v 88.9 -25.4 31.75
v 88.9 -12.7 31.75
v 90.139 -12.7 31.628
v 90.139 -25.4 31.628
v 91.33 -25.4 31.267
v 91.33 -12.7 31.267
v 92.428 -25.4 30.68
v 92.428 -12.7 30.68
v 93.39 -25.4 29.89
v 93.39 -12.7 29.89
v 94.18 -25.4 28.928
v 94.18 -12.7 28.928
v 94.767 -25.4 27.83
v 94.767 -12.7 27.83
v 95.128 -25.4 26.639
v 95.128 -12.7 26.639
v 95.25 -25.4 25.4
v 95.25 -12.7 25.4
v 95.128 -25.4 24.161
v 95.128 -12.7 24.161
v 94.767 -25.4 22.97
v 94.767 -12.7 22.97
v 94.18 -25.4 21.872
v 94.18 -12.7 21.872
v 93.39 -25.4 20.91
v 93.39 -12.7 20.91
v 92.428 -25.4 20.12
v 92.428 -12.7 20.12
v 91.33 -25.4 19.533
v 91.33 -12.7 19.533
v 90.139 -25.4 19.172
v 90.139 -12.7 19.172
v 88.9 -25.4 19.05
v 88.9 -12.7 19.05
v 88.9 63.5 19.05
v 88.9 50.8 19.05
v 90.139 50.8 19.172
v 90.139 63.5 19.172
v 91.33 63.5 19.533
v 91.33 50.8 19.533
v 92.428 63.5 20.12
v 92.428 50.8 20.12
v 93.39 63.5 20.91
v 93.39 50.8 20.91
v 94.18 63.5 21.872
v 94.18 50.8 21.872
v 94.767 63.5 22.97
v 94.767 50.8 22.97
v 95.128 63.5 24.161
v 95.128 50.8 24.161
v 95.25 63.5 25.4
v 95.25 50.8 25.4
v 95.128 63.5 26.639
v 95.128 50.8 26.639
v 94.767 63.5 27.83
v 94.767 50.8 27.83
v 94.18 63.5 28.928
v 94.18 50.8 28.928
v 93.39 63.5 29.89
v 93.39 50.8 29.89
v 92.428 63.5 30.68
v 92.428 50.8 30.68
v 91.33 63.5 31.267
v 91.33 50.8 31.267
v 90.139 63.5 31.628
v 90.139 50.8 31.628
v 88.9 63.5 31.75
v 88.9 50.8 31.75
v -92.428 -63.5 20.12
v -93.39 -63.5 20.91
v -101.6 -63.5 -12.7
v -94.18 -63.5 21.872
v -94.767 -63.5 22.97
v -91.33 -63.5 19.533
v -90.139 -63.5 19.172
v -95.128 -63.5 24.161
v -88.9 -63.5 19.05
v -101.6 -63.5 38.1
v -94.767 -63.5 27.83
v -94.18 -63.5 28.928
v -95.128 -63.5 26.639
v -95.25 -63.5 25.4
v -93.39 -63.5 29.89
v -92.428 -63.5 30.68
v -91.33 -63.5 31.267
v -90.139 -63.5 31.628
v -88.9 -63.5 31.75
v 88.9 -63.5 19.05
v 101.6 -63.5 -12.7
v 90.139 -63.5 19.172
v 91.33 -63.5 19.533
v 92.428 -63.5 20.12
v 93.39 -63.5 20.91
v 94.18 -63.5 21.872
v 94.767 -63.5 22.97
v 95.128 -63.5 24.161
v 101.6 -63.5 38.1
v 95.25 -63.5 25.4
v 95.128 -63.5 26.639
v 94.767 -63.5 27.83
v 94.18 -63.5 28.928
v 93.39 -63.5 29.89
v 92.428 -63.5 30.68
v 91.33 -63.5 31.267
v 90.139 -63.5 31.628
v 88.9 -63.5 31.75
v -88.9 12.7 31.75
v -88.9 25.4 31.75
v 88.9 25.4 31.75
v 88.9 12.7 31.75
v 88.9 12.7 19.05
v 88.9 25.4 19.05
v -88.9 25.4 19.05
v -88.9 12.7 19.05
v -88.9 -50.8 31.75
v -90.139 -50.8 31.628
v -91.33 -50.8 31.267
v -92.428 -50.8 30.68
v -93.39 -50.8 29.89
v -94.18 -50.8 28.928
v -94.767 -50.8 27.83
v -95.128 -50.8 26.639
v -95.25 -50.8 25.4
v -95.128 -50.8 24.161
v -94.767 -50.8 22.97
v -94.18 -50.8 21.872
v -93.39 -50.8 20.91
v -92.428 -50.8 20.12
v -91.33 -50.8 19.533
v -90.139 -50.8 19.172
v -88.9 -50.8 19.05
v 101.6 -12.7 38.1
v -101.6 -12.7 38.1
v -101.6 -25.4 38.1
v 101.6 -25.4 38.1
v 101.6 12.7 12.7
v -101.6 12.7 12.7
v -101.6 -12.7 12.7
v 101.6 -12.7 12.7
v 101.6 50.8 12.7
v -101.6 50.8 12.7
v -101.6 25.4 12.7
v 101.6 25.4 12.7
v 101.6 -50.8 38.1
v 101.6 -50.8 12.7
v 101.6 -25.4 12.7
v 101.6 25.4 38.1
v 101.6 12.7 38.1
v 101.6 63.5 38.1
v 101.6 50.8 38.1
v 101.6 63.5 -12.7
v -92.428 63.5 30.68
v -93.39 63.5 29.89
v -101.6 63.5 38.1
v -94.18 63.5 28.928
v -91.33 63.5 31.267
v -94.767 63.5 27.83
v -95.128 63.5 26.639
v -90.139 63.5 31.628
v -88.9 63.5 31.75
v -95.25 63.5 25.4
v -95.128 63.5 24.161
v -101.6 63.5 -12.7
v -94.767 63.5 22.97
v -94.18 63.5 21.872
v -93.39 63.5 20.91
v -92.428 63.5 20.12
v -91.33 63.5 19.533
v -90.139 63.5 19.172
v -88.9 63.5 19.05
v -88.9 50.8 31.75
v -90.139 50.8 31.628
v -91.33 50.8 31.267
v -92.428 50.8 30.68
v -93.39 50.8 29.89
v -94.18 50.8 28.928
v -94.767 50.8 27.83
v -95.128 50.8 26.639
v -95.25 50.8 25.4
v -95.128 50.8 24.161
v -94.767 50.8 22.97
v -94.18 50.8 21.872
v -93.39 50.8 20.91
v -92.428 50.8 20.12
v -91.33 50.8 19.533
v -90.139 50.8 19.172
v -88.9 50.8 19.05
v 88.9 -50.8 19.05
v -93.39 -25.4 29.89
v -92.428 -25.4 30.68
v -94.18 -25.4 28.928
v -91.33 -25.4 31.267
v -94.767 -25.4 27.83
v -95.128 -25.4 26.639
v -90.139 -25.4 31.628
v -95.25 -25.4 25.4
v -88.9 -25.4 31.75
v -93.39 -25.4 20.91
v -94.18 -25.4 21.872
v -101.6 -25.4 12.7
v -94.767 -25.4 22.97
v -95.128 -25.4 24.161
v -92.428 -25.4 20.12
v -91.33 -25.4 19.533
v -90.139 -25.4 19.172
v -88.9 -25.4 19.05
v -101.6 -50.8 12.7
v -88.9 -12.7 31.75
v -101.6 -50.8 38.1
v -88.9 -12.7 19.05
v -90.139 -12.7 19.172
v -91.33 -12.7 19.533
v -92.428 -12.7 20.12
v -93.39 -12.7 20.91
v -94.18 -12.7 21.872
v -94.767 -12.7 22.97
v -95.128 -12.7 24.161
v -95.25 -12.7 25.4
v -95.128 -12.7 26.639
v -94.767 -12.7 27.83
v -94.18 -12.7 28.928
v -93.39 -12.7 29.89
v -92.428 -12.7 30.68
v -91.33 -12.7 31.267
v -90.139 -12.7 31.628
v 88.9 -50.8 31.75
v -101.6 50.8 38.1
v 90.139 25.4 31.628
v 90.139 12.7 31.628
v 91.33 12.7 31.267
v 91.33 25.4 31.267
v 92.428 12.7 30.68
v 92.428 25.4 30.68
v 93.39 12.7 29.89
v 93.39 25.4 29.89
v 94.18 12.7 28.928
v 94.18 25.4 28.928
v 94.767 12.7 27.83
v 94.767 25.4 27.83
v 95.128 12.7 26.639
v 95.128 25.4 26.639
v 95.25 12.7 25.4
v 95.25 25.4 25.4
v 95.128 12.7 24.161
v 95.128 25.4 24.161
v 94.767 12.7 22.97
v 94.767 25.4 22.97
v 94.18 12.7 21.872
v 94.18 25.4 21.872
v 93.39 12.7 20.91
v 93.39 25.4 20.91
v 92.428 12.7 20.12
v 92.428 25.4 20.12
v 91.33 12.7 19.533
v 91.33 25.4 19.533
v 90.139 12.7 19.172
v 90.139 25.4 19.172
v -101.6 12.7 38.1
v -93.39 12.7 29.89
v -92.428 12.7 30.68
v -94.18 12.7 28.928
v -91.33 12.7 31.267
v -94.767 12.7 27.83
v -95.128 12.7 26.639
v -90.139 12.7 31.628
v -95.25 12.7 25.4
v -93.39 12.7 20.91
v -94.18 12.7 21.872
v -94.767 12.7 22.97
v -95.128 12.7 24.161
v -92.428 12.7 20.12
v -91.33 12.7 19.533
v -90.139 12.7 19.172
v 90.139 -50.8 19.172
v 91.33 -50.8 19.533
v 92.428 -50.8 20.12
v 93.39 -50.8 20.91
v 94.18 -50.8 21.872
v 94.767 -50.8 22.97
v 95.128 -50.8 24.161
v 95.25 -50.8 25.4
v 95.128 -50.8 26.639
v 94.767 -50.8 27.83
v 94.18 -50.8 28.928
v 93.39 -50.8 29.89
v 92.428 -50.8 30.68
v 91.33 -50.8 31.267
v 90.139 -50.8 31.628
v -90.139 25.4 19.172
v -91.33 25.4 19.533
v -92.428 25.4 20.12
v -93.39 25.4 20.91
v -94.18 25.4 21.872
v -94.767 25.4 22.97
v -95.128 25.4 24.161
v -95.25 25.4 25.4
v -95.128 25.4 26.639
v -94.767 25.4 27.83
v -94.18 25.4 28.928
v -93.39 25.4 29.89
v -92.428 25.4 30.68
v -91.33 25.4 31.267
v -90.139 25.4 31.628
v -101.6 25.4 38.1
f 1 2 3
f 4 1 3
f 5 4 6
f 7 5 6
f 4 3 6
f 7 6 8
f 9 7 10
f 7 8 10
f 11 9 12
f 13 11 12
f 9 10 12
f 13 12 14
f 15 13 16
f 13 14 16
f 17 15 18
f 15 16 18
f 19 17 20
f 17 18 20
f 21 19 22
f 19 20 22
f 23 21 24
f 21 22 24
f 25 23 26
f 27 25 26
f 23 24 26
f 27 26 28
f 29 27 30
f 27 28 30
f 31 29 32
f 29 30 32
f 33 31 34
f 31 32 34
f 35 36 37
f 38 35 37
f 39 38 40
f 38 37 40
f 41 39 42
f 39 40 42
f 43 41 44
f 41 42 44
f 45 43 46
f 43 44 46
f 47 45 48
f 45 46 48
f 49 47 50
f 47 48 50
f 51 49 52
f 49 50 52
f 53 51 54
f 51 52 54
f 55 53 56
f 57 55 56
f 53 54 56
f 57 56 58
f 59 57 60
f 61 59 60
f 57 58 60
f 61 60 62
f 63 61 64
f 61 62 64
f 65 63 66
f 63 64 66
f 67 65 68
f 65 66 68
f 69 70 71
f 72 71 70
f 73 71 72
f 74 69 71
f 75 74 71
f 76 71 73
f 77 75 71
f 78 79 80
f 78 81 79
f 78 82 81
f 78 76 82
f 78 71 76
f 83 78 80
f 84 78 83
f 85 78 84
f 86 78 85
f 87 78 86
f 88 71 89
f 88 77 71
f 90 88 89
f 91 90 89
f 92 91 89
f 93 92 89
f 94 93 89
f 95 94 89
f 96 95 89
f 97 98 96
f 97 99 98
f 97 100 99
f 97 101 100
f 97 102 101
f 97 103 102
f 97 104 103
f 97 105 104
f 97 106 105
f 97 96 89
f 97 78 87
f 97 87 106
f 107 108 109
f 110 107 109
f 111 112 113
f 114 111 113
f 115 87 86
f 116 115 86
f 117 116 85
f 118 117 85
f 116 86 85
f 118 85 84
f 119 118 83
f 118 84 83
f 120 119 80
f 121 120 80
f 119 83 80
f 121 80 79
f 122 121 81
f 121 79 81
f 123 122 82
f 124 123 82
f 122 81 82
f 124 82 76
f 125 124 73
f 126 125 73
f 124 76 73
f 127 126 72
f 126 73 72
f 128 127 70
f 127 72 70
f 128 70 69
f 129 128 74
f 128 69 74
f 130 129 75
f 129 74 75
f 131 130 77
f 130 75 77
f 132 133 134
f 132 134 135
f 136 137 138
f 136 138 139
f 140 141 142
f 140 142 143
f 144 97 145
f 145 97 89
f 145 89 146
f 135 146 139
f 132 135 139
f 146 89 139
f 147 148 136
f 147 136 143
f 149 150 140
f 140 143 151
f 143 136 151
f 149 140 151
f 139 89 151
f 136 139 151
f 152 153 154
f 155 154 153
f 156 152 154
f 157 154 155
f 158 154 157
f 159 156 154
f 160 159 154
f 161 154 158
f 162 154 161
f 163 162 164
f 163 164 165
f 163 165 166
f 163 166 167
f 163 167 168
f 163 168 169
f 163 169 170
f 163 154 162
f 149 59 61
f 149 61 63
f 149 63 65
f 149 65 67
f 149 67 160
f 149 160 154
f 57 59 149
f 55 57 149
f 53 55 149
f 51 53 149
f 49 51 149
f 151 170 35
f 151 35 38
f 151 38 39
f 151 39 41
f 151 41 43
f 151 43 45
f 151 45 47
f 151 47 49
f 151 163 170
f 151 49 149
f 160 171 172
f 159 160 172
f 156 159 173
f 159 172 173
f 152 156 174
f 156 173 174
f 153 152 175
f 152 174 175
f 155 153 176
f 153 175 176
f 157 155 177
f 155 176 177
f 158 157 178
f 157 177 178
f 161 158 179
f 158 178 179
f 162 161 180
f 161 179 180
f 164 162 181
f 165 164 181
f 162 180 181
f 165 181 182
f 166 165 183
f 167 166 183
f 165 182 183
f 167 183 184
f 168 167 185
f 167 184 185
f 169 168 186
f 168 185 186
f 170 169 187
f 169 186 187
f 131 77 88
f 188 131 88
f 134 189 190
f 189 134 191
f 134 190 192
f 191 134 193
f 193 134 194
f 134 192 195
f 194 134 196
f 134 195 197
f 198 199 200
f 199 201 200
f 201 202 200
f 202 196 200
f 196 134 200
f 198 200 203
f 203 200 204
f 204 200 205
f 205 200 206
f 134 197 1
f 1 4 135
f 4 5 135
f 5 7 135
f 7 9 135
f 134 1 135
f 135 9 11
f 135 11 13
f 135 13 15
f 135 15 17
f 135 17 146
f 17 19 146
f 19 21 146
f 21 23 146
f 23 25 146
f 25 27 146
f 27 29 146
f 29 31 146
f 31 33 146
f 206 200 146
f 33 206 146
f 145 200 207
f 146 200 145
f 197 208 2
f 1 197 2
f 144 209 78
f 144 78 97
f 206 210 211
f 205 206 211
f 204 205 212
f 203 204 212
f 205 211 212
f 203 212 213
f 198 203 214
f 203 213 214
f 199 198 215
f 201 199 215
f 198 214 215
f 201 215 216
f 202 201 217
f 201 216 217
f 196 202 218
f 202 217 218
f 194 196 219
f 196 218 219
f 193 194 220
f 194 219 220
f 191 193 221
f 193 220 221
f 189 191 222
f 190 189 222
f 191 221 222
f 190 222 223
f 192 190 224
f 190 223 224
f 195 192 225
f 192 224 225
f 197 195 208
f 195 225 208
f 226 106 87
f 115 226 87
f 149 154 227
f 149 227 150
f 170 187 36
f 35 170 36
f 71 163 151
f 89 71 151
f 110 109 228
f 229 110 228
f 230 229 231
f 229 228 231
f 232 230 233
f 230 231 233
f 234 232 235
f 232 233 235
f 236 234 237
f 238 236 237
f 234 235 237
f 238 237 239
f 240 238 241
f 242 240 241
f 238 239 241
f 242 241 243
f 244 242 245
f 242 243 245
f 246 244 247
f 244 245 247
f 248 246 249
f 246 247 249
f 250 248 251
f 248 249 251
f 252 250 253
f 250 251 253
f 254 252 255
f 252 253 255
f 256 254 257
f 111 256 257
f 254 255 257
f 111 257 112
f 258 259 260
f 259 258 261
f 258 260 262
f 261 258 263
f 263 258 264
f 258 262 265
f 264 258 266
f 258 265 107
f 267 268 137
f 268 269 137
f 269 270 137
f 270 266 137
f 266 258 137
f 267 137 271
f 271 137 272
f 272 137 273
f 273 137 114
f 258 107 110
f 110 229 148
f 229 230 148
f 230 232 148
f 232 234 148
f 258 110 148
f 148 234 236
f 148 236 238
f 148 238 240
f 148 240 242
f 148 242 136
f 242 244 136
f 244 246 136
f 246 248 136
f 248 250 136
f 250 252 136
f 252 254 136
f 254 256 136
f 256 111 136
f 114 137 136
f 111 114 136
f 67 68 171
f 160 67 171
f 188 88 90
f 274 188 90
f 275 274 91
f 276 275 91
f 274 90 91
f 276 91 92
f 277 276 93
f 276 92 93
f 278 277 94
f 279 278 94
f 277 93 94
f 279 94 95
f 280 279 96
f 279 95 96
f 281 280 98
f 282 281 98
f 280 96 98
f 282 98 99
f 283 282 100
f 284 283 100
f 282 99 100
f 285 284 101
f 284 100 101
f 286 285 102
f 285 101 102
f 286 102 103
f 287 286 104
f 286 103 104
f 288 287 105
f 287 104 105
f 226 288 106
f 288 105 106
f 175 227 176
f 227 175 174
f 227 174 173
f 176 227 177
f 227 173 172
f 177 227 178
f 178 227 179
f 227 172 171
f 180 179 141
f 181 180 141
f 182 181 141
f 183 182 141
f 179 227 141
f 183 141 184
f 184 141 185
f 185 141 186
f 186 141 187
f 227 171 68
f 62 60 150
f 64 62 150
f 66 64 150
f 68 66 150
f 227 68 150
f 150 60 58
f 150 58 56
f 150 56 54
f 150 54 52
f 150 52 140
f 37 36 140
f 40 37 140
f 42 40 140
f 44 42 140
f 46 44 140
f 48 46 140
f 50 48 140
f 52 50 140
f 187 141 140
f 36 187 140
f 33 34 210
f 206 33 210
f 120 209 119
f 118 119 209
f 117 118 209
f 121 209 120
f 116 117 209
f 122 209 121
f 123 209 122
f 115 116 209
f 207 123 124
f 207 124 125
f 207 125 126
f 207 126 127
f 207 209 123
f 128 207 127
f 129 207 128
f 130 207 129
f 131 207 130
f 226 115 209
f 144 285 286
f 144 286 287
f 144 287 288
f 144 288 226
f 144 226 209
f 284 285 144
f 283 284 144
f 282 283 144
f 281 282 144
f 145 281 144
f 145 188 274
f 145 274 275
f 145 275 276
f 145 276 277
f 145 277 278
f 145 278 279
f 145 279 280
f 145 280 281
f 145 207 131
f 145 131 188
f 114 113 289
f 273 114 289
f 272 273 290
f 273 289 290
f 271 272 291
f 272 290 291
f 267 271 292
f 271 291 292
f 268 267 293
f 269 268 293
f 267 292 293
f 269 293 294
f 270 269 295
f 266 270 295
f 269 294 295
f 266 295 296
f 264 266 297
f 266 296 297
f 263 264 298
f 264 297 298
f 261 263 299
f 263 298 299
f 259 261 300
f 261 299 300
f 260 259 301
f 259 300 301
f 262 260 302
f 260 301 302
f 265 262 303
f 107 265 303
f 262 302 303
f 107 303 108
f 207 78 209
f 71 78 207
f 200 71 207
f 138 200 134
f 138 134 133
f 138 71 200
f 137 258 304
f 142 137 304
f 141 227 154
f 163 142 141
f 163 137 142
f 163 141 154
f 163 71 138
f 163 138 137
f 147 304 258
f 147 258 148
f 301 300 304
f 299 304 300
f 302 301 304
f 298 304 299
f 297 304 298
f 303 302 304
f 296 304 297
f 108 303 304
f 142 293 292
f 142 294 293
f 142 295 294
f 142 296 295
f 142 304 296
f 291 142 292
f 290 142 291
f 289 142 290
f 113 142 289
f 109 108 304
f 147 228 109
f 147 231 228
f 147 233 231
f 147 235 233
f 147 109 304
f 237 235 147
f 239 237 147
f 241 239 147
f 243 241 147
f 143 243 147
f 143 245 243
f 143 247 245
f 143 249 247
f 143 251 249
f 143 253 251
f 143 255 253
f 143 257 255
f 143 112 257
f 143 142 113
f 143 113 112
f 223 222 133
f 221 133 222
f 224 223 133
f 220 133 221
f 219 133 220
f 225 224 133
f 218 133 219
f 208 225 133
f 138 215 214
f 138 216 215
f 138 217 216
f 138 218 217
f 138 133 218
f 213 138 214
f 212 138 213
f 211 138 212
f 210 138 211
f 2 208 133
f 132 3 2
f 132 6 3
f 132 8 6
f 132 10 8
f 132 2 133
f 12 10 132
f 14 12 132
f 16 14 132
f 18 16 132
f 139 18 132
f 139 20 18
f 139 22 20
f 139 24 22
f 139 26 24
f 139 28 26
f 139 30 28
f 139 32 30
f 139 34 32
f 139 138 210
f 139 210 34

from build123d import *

# Parameters (mm, degrees)
F0_W     = 203.2
F0_H     = 127
F1_DEPTH = 12.7
F2_W     = 203.2
F2_H     = 12.7
F3_DEPTH = 25.4
F5_DEPTH = 127
F6_W     = 203.2
F6_H     = 12.7
F7_DEPTH = 25.4
F9_DEPTH = 50.8


with BuildPart() as f1:
    # F0 (on Top) → F1 (new body, symmetric)
    with BuildSketch(Plane.XY):
        Rectangle(F0_W, F0_H)
    extrude(amount=F1_DEPTH, both=True)

    # F2 (on face) → F3 (join)
    with BuildSketch(Plane.XY.offset(12.7)):
        with Locations((0, 57.15)):
            Rectangle(F2_W, F2_H)
        with Locations((0, -57.15)):
            Rectangle(F2_W, F2_H)
    extrude(amount=F3_DEPTH)

    # F4 (on face) → F5 (cut)
    with BuildSketch(Plane.XZ.offset(63.5)):
        with BuildLine():
            Line((-88.9, 19.05), (88.9, 19.05))
            ThreePointArc((88.9, 19.05), (95.25, 25.4), (88.9, 31.75))
            Line((88.9, 31.75), (-88.9, 31.75))
            ThreePointArc((-88.9, 31.75), (-95.25, 25.4), (-88.9, 19.05))
        make_face()
    extrude(amount=-F5_DEPTH, mode=Mode.SUBTRACT)

    # F6 (on face) → F7 (join)
    with BuildSketch(Plane.XY.offset(12.7)):
        with Locations((0, 19.05)):
            Rectangle(F6_W, F6_H)
        with Locations((0, -19.05)):
            Rectangle(F6_W, F6_H)
    extrude(amount=F7_DEPTH)

    # F8 (on face) → F9 (cut)
    with BuildSketch(Plane(origin=(0, 25.4, 0), x_dir=(-1, 0, 0), z_dir=(0, 1, 0))):
        with BuildLine():
            Line((88.9, 31.75), (-88.9, 31.75))
            ThreePointArc((-88.9, 31.75), (-95.25, 25.4), (-88.9, 19.05))
            Line((-88.9, 19.05), (88.9, 19.05))
            ThreePointArc((88.9, 19.05), (95.25, 25.4), (88.9, 31.75))
        make_face()
    extrude(amount=-F9_DEPTH, mode=Mode.SUBTRACT)


solid = f1.part
